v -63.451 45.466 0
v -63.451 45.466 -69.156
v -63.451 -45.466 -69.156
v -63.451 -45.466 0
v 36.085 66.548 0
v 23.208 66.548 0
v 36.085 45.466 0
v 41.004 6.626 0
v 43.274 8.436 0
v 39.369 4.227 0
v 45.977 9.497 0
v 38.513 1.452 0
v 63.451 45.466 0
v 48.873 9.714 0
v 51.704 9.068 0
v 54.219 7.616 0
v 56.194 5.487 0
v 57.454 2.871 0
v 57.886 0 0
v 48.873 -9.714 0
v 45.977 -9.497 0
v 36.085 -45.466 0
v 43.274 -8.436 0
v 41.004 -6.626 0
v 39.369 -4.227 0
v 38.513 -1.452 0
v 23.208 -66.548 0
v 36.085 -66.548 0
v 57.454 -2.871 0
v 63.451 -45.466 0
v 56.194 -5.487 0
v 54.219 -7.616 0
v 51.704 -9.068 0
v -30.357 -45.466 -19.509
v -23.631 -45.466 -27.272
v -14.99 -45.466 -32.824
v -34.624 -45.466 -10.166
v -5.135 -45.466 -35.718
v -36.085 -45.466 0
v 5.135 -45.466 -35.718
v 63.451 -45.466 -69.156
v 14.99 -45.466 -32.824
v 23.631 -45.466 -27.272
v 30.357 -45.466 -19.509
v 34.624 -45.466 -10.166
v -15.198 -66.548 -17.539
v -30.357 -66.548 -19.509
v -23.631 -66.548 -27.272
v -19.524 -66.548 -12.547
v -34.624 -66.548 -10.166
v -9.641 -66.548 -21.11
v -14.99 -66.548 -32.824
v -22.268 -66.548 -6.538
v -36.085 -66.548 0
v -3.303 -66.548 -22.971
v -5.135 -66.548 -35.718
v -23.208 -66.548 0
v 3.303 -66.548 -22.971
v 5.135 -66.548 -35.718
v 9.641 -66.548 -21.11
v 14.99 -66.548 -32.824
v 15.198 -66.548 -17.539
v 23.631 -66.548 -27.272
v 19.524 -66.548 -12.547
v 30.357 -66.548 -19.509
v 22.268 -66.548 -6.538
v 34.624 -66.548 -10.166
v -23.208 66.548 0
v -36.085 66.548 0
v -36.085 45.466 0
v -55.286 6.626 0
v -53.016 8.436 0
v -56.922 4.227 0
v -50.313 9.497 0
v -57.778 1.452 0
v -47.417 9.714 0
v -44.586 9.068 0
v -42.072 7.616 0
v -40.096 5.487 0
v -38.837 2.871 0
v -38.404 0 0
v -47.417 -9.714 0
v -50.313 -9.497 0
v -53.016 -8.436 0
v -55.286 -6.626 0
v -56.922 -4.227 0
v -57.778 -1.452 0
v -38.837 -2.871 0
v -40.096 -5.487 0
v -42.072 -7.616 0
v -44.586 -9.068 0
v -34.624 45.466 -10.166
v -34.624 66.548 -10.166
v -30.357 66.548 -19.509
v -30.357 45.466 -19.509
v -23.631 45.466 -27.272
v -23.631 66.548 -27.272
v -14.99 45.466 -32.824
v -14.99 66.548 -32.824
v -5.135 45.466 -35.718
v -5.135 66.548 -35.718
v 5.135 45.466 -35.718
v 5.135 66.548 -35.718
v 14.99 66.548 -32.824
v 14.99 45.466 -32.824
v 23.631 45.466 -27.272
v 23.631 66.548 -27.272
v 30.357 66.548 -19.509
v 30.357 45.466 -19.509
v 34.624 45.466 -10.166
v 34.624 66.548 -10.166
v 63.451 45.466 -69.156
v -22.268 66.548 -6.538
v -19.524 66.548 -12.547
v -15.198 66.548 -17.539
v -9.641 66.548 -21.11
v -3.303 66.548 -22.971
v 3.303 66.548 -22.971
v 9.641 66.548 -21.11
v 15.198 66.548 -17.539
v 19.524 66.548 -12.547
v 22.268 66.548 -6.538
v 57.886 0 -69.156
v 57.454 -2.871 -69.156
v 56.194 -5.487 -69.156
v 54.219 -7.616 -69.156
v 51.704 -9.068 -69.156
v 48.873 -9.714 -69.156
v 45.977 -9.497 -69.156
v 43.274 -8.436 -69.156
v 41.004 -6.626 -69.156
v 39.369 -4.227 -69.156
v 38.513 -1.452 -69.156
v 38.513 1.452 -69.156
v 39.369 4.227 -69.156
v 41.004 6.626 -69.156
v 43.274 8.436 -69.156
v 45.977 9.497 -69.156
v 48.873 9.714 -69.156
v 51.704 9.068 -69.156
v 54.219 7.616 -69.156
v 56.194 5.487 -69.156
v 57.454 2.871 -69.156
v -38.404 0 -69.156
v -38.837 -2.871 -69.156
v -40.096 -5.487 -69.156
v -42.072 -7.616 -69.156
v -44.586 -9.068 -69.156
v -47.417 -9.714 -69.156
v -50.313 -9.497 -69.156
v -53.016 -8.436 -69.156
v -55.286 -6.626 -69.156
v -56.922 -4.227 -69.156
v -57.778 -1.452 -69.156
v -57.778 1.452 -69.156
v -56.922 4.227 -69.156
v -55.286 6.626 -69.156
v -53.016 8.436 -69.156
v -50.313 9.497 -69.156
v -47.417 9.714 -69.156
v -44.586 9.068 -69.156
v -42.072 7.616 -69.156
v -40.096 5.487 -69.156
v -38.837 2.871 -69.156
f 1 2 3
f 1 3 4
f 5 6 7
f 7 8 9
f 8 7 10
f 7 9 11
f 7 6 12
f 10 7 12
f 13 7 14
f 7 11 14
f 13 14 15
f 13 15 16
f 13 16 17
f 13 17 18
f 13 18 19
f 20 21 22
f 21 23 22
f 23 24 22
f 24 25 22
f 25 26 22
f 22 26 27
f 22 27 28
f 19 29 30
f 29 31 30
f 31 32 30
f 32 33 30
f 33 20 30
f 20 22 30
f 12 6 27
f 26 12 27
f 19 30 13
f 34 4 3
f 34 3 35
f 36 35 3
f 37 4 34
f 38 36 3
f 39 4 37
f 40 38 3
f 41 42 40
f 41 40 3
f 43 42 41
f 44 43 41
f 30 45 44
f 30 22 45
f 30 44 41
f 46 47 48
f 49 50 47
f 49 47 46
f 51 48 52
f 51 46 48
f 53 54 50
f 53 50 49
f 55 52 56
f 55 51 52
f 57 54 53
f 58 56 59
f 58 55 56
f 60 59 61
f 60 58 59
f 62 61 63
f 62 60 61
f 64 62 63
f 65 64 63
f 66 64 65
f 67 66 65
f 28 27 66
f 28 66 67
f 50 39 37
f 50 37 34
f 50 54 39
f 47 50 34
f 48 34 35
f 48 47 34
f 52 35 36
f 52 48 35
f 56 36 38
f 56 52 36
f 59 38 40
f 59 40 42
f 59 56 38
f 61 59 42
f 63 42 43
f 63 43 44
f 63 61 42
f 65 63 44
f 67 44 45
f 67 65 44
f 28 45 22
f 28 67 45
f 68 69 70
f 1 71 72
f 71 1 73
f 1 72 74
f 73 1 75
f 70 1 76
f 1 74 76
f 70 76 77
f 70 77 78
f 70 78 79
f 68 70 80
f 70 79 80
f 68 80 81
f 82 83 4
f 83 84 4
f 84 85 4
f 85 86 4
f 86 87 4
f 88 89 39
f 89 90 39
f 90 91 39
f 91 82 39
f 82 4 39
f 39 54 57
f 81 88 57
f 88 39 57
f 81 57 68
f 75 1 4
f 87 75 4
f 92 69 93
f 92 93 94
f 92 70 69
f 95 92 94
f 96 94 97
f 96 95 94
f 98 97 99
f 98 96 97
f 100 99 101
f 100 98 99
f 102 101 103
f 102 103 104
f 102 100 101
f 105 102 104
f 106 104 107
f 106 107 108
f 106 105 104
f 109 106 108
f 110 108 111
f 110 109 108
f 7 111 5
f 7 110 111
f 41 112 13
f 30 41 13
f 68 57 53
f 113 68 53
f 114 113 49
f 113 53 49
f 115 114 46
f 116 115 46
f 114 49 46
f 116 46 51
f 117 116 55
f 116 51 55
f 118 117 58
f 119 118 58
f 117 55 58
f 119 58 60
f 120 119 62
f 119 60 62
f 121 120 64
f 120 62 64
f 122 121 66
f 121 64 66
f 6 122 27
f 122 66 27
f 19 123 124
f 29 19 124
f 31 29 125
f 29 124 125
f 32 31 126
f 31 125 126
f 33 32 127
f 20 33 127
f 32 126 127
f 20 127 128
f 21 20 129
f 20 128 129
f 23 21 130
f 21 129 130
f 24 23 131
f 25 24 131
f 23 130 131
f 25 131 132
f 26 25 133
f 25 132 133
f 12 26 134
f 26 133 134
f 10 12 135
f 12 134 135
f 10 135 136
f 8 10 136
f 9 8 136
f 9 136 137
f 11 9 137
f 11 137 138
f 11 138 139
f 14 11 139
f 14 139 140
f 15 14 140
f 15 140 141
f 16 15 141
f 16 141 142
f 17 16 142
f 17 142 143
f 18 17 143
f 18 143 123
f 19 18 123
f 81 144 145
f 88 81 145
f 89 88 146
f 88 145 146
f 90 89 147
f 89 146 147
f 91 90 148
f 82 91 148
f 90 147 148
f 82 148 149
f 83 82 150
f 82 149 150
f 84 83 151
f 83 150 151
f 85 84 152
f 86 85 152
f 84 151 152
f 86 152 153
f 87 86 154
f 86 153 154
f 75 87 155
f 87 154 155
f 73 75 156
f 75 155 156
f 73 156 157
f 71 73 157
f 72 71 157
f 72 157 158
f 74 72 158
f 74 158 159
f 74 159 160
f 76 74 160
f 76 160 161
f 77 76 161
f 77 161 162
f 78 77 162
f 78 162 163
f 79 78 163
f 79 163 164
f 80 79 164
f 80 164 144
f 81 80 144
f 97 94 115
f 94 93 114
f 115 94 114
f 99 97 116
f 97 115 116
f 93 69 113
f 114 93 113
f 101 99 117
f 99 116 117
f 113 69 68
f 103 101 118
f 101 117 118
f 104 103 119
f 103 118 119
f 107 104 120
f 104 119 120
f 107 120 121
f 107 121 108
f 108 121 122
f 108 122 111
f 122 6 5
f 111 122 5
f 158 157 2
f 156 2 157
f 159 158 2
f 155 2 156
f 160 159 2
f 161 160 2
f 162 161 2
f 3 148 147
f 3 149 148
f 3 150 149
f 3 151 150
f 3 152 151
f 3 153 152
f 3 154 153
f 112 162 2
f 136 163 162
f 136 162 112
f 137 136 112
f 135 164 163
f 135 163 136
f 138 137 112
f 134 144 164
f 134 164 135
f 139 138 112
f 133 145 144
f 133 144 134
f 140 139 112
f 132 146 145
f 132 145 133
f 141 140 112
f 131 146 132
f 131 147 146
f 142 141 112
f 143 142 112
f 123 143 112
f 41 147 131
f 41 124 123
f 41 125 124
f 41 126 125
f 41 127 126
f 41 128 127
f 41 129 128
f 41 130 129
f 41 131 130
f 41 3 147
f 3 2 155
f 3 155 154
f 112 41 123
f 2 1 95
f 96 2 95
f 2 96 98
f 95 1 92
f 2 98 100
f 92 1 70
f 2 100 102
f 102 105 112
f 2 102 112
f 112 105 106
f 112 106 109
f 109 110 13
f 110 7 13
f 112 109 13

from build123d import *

# Parameters (mm, degrees)
F0_W     = 126.902834
F0_H     = 138.312936
F1_DEPTH = 45.466
F2_R     = 36.085461
F3_DEPTH = 66.548
F4_R     = 23.207671
F5_DEPTH = 157.988
F6_W     = 174.213074
F6_H     = 78.061931
F7_DEPTH = 75.946
F8_R     = 9.741343
F9_DEPTH = 80.264


with BuildPart() as f1:
    # F0 (on Front) → F1 (new body, symmetric)
    with BuildSketch(Plane.XZ):
        Rectangle(F0_W, F0_H)
    extrude(amount=F1_DEPTH, both=True)

    # F2 (on Front) → F3 (join, symmetric)
    with BuildSketch(Plane.XZ):
        Circle(F2_R)
    extrude(amount=F3_DEPTH, both=True)

    # F4 (on face) → F5 (cut)
    with BuildSketch(Plane.XZ.offset(66.548)):
        Circle(F4_R)
    extrude(amount=-F5_DEPTH, mode=Mode.SUBTRACT)

    # F6 (on Front) → F7 (cut, symmetric)
    with BuildSketch(Plane.XZ):
        with Locations((2.504658, 39.030966)):
            Rectangle(F6_W, F6_H)
    extrude(amount=F7_DEPTH, both=True, mode=Mode.SUBTRACT)

    # F8 (on face) → F9 (cut)
    with BuildSketch(Plane(origin=(0, 0, -69.156468), x_dir=(1, 0, 0), z_dir=(0, 0, -1))):
        with Locations((48.145149, 0)):
            Circle(F8_R)
        with Locations((-48.145149, 0)):
            Circle(F8_R)
    extrude(amount=-F9_DEPTH, mode=Mode.SUBTRACT)


solid = f1.part
